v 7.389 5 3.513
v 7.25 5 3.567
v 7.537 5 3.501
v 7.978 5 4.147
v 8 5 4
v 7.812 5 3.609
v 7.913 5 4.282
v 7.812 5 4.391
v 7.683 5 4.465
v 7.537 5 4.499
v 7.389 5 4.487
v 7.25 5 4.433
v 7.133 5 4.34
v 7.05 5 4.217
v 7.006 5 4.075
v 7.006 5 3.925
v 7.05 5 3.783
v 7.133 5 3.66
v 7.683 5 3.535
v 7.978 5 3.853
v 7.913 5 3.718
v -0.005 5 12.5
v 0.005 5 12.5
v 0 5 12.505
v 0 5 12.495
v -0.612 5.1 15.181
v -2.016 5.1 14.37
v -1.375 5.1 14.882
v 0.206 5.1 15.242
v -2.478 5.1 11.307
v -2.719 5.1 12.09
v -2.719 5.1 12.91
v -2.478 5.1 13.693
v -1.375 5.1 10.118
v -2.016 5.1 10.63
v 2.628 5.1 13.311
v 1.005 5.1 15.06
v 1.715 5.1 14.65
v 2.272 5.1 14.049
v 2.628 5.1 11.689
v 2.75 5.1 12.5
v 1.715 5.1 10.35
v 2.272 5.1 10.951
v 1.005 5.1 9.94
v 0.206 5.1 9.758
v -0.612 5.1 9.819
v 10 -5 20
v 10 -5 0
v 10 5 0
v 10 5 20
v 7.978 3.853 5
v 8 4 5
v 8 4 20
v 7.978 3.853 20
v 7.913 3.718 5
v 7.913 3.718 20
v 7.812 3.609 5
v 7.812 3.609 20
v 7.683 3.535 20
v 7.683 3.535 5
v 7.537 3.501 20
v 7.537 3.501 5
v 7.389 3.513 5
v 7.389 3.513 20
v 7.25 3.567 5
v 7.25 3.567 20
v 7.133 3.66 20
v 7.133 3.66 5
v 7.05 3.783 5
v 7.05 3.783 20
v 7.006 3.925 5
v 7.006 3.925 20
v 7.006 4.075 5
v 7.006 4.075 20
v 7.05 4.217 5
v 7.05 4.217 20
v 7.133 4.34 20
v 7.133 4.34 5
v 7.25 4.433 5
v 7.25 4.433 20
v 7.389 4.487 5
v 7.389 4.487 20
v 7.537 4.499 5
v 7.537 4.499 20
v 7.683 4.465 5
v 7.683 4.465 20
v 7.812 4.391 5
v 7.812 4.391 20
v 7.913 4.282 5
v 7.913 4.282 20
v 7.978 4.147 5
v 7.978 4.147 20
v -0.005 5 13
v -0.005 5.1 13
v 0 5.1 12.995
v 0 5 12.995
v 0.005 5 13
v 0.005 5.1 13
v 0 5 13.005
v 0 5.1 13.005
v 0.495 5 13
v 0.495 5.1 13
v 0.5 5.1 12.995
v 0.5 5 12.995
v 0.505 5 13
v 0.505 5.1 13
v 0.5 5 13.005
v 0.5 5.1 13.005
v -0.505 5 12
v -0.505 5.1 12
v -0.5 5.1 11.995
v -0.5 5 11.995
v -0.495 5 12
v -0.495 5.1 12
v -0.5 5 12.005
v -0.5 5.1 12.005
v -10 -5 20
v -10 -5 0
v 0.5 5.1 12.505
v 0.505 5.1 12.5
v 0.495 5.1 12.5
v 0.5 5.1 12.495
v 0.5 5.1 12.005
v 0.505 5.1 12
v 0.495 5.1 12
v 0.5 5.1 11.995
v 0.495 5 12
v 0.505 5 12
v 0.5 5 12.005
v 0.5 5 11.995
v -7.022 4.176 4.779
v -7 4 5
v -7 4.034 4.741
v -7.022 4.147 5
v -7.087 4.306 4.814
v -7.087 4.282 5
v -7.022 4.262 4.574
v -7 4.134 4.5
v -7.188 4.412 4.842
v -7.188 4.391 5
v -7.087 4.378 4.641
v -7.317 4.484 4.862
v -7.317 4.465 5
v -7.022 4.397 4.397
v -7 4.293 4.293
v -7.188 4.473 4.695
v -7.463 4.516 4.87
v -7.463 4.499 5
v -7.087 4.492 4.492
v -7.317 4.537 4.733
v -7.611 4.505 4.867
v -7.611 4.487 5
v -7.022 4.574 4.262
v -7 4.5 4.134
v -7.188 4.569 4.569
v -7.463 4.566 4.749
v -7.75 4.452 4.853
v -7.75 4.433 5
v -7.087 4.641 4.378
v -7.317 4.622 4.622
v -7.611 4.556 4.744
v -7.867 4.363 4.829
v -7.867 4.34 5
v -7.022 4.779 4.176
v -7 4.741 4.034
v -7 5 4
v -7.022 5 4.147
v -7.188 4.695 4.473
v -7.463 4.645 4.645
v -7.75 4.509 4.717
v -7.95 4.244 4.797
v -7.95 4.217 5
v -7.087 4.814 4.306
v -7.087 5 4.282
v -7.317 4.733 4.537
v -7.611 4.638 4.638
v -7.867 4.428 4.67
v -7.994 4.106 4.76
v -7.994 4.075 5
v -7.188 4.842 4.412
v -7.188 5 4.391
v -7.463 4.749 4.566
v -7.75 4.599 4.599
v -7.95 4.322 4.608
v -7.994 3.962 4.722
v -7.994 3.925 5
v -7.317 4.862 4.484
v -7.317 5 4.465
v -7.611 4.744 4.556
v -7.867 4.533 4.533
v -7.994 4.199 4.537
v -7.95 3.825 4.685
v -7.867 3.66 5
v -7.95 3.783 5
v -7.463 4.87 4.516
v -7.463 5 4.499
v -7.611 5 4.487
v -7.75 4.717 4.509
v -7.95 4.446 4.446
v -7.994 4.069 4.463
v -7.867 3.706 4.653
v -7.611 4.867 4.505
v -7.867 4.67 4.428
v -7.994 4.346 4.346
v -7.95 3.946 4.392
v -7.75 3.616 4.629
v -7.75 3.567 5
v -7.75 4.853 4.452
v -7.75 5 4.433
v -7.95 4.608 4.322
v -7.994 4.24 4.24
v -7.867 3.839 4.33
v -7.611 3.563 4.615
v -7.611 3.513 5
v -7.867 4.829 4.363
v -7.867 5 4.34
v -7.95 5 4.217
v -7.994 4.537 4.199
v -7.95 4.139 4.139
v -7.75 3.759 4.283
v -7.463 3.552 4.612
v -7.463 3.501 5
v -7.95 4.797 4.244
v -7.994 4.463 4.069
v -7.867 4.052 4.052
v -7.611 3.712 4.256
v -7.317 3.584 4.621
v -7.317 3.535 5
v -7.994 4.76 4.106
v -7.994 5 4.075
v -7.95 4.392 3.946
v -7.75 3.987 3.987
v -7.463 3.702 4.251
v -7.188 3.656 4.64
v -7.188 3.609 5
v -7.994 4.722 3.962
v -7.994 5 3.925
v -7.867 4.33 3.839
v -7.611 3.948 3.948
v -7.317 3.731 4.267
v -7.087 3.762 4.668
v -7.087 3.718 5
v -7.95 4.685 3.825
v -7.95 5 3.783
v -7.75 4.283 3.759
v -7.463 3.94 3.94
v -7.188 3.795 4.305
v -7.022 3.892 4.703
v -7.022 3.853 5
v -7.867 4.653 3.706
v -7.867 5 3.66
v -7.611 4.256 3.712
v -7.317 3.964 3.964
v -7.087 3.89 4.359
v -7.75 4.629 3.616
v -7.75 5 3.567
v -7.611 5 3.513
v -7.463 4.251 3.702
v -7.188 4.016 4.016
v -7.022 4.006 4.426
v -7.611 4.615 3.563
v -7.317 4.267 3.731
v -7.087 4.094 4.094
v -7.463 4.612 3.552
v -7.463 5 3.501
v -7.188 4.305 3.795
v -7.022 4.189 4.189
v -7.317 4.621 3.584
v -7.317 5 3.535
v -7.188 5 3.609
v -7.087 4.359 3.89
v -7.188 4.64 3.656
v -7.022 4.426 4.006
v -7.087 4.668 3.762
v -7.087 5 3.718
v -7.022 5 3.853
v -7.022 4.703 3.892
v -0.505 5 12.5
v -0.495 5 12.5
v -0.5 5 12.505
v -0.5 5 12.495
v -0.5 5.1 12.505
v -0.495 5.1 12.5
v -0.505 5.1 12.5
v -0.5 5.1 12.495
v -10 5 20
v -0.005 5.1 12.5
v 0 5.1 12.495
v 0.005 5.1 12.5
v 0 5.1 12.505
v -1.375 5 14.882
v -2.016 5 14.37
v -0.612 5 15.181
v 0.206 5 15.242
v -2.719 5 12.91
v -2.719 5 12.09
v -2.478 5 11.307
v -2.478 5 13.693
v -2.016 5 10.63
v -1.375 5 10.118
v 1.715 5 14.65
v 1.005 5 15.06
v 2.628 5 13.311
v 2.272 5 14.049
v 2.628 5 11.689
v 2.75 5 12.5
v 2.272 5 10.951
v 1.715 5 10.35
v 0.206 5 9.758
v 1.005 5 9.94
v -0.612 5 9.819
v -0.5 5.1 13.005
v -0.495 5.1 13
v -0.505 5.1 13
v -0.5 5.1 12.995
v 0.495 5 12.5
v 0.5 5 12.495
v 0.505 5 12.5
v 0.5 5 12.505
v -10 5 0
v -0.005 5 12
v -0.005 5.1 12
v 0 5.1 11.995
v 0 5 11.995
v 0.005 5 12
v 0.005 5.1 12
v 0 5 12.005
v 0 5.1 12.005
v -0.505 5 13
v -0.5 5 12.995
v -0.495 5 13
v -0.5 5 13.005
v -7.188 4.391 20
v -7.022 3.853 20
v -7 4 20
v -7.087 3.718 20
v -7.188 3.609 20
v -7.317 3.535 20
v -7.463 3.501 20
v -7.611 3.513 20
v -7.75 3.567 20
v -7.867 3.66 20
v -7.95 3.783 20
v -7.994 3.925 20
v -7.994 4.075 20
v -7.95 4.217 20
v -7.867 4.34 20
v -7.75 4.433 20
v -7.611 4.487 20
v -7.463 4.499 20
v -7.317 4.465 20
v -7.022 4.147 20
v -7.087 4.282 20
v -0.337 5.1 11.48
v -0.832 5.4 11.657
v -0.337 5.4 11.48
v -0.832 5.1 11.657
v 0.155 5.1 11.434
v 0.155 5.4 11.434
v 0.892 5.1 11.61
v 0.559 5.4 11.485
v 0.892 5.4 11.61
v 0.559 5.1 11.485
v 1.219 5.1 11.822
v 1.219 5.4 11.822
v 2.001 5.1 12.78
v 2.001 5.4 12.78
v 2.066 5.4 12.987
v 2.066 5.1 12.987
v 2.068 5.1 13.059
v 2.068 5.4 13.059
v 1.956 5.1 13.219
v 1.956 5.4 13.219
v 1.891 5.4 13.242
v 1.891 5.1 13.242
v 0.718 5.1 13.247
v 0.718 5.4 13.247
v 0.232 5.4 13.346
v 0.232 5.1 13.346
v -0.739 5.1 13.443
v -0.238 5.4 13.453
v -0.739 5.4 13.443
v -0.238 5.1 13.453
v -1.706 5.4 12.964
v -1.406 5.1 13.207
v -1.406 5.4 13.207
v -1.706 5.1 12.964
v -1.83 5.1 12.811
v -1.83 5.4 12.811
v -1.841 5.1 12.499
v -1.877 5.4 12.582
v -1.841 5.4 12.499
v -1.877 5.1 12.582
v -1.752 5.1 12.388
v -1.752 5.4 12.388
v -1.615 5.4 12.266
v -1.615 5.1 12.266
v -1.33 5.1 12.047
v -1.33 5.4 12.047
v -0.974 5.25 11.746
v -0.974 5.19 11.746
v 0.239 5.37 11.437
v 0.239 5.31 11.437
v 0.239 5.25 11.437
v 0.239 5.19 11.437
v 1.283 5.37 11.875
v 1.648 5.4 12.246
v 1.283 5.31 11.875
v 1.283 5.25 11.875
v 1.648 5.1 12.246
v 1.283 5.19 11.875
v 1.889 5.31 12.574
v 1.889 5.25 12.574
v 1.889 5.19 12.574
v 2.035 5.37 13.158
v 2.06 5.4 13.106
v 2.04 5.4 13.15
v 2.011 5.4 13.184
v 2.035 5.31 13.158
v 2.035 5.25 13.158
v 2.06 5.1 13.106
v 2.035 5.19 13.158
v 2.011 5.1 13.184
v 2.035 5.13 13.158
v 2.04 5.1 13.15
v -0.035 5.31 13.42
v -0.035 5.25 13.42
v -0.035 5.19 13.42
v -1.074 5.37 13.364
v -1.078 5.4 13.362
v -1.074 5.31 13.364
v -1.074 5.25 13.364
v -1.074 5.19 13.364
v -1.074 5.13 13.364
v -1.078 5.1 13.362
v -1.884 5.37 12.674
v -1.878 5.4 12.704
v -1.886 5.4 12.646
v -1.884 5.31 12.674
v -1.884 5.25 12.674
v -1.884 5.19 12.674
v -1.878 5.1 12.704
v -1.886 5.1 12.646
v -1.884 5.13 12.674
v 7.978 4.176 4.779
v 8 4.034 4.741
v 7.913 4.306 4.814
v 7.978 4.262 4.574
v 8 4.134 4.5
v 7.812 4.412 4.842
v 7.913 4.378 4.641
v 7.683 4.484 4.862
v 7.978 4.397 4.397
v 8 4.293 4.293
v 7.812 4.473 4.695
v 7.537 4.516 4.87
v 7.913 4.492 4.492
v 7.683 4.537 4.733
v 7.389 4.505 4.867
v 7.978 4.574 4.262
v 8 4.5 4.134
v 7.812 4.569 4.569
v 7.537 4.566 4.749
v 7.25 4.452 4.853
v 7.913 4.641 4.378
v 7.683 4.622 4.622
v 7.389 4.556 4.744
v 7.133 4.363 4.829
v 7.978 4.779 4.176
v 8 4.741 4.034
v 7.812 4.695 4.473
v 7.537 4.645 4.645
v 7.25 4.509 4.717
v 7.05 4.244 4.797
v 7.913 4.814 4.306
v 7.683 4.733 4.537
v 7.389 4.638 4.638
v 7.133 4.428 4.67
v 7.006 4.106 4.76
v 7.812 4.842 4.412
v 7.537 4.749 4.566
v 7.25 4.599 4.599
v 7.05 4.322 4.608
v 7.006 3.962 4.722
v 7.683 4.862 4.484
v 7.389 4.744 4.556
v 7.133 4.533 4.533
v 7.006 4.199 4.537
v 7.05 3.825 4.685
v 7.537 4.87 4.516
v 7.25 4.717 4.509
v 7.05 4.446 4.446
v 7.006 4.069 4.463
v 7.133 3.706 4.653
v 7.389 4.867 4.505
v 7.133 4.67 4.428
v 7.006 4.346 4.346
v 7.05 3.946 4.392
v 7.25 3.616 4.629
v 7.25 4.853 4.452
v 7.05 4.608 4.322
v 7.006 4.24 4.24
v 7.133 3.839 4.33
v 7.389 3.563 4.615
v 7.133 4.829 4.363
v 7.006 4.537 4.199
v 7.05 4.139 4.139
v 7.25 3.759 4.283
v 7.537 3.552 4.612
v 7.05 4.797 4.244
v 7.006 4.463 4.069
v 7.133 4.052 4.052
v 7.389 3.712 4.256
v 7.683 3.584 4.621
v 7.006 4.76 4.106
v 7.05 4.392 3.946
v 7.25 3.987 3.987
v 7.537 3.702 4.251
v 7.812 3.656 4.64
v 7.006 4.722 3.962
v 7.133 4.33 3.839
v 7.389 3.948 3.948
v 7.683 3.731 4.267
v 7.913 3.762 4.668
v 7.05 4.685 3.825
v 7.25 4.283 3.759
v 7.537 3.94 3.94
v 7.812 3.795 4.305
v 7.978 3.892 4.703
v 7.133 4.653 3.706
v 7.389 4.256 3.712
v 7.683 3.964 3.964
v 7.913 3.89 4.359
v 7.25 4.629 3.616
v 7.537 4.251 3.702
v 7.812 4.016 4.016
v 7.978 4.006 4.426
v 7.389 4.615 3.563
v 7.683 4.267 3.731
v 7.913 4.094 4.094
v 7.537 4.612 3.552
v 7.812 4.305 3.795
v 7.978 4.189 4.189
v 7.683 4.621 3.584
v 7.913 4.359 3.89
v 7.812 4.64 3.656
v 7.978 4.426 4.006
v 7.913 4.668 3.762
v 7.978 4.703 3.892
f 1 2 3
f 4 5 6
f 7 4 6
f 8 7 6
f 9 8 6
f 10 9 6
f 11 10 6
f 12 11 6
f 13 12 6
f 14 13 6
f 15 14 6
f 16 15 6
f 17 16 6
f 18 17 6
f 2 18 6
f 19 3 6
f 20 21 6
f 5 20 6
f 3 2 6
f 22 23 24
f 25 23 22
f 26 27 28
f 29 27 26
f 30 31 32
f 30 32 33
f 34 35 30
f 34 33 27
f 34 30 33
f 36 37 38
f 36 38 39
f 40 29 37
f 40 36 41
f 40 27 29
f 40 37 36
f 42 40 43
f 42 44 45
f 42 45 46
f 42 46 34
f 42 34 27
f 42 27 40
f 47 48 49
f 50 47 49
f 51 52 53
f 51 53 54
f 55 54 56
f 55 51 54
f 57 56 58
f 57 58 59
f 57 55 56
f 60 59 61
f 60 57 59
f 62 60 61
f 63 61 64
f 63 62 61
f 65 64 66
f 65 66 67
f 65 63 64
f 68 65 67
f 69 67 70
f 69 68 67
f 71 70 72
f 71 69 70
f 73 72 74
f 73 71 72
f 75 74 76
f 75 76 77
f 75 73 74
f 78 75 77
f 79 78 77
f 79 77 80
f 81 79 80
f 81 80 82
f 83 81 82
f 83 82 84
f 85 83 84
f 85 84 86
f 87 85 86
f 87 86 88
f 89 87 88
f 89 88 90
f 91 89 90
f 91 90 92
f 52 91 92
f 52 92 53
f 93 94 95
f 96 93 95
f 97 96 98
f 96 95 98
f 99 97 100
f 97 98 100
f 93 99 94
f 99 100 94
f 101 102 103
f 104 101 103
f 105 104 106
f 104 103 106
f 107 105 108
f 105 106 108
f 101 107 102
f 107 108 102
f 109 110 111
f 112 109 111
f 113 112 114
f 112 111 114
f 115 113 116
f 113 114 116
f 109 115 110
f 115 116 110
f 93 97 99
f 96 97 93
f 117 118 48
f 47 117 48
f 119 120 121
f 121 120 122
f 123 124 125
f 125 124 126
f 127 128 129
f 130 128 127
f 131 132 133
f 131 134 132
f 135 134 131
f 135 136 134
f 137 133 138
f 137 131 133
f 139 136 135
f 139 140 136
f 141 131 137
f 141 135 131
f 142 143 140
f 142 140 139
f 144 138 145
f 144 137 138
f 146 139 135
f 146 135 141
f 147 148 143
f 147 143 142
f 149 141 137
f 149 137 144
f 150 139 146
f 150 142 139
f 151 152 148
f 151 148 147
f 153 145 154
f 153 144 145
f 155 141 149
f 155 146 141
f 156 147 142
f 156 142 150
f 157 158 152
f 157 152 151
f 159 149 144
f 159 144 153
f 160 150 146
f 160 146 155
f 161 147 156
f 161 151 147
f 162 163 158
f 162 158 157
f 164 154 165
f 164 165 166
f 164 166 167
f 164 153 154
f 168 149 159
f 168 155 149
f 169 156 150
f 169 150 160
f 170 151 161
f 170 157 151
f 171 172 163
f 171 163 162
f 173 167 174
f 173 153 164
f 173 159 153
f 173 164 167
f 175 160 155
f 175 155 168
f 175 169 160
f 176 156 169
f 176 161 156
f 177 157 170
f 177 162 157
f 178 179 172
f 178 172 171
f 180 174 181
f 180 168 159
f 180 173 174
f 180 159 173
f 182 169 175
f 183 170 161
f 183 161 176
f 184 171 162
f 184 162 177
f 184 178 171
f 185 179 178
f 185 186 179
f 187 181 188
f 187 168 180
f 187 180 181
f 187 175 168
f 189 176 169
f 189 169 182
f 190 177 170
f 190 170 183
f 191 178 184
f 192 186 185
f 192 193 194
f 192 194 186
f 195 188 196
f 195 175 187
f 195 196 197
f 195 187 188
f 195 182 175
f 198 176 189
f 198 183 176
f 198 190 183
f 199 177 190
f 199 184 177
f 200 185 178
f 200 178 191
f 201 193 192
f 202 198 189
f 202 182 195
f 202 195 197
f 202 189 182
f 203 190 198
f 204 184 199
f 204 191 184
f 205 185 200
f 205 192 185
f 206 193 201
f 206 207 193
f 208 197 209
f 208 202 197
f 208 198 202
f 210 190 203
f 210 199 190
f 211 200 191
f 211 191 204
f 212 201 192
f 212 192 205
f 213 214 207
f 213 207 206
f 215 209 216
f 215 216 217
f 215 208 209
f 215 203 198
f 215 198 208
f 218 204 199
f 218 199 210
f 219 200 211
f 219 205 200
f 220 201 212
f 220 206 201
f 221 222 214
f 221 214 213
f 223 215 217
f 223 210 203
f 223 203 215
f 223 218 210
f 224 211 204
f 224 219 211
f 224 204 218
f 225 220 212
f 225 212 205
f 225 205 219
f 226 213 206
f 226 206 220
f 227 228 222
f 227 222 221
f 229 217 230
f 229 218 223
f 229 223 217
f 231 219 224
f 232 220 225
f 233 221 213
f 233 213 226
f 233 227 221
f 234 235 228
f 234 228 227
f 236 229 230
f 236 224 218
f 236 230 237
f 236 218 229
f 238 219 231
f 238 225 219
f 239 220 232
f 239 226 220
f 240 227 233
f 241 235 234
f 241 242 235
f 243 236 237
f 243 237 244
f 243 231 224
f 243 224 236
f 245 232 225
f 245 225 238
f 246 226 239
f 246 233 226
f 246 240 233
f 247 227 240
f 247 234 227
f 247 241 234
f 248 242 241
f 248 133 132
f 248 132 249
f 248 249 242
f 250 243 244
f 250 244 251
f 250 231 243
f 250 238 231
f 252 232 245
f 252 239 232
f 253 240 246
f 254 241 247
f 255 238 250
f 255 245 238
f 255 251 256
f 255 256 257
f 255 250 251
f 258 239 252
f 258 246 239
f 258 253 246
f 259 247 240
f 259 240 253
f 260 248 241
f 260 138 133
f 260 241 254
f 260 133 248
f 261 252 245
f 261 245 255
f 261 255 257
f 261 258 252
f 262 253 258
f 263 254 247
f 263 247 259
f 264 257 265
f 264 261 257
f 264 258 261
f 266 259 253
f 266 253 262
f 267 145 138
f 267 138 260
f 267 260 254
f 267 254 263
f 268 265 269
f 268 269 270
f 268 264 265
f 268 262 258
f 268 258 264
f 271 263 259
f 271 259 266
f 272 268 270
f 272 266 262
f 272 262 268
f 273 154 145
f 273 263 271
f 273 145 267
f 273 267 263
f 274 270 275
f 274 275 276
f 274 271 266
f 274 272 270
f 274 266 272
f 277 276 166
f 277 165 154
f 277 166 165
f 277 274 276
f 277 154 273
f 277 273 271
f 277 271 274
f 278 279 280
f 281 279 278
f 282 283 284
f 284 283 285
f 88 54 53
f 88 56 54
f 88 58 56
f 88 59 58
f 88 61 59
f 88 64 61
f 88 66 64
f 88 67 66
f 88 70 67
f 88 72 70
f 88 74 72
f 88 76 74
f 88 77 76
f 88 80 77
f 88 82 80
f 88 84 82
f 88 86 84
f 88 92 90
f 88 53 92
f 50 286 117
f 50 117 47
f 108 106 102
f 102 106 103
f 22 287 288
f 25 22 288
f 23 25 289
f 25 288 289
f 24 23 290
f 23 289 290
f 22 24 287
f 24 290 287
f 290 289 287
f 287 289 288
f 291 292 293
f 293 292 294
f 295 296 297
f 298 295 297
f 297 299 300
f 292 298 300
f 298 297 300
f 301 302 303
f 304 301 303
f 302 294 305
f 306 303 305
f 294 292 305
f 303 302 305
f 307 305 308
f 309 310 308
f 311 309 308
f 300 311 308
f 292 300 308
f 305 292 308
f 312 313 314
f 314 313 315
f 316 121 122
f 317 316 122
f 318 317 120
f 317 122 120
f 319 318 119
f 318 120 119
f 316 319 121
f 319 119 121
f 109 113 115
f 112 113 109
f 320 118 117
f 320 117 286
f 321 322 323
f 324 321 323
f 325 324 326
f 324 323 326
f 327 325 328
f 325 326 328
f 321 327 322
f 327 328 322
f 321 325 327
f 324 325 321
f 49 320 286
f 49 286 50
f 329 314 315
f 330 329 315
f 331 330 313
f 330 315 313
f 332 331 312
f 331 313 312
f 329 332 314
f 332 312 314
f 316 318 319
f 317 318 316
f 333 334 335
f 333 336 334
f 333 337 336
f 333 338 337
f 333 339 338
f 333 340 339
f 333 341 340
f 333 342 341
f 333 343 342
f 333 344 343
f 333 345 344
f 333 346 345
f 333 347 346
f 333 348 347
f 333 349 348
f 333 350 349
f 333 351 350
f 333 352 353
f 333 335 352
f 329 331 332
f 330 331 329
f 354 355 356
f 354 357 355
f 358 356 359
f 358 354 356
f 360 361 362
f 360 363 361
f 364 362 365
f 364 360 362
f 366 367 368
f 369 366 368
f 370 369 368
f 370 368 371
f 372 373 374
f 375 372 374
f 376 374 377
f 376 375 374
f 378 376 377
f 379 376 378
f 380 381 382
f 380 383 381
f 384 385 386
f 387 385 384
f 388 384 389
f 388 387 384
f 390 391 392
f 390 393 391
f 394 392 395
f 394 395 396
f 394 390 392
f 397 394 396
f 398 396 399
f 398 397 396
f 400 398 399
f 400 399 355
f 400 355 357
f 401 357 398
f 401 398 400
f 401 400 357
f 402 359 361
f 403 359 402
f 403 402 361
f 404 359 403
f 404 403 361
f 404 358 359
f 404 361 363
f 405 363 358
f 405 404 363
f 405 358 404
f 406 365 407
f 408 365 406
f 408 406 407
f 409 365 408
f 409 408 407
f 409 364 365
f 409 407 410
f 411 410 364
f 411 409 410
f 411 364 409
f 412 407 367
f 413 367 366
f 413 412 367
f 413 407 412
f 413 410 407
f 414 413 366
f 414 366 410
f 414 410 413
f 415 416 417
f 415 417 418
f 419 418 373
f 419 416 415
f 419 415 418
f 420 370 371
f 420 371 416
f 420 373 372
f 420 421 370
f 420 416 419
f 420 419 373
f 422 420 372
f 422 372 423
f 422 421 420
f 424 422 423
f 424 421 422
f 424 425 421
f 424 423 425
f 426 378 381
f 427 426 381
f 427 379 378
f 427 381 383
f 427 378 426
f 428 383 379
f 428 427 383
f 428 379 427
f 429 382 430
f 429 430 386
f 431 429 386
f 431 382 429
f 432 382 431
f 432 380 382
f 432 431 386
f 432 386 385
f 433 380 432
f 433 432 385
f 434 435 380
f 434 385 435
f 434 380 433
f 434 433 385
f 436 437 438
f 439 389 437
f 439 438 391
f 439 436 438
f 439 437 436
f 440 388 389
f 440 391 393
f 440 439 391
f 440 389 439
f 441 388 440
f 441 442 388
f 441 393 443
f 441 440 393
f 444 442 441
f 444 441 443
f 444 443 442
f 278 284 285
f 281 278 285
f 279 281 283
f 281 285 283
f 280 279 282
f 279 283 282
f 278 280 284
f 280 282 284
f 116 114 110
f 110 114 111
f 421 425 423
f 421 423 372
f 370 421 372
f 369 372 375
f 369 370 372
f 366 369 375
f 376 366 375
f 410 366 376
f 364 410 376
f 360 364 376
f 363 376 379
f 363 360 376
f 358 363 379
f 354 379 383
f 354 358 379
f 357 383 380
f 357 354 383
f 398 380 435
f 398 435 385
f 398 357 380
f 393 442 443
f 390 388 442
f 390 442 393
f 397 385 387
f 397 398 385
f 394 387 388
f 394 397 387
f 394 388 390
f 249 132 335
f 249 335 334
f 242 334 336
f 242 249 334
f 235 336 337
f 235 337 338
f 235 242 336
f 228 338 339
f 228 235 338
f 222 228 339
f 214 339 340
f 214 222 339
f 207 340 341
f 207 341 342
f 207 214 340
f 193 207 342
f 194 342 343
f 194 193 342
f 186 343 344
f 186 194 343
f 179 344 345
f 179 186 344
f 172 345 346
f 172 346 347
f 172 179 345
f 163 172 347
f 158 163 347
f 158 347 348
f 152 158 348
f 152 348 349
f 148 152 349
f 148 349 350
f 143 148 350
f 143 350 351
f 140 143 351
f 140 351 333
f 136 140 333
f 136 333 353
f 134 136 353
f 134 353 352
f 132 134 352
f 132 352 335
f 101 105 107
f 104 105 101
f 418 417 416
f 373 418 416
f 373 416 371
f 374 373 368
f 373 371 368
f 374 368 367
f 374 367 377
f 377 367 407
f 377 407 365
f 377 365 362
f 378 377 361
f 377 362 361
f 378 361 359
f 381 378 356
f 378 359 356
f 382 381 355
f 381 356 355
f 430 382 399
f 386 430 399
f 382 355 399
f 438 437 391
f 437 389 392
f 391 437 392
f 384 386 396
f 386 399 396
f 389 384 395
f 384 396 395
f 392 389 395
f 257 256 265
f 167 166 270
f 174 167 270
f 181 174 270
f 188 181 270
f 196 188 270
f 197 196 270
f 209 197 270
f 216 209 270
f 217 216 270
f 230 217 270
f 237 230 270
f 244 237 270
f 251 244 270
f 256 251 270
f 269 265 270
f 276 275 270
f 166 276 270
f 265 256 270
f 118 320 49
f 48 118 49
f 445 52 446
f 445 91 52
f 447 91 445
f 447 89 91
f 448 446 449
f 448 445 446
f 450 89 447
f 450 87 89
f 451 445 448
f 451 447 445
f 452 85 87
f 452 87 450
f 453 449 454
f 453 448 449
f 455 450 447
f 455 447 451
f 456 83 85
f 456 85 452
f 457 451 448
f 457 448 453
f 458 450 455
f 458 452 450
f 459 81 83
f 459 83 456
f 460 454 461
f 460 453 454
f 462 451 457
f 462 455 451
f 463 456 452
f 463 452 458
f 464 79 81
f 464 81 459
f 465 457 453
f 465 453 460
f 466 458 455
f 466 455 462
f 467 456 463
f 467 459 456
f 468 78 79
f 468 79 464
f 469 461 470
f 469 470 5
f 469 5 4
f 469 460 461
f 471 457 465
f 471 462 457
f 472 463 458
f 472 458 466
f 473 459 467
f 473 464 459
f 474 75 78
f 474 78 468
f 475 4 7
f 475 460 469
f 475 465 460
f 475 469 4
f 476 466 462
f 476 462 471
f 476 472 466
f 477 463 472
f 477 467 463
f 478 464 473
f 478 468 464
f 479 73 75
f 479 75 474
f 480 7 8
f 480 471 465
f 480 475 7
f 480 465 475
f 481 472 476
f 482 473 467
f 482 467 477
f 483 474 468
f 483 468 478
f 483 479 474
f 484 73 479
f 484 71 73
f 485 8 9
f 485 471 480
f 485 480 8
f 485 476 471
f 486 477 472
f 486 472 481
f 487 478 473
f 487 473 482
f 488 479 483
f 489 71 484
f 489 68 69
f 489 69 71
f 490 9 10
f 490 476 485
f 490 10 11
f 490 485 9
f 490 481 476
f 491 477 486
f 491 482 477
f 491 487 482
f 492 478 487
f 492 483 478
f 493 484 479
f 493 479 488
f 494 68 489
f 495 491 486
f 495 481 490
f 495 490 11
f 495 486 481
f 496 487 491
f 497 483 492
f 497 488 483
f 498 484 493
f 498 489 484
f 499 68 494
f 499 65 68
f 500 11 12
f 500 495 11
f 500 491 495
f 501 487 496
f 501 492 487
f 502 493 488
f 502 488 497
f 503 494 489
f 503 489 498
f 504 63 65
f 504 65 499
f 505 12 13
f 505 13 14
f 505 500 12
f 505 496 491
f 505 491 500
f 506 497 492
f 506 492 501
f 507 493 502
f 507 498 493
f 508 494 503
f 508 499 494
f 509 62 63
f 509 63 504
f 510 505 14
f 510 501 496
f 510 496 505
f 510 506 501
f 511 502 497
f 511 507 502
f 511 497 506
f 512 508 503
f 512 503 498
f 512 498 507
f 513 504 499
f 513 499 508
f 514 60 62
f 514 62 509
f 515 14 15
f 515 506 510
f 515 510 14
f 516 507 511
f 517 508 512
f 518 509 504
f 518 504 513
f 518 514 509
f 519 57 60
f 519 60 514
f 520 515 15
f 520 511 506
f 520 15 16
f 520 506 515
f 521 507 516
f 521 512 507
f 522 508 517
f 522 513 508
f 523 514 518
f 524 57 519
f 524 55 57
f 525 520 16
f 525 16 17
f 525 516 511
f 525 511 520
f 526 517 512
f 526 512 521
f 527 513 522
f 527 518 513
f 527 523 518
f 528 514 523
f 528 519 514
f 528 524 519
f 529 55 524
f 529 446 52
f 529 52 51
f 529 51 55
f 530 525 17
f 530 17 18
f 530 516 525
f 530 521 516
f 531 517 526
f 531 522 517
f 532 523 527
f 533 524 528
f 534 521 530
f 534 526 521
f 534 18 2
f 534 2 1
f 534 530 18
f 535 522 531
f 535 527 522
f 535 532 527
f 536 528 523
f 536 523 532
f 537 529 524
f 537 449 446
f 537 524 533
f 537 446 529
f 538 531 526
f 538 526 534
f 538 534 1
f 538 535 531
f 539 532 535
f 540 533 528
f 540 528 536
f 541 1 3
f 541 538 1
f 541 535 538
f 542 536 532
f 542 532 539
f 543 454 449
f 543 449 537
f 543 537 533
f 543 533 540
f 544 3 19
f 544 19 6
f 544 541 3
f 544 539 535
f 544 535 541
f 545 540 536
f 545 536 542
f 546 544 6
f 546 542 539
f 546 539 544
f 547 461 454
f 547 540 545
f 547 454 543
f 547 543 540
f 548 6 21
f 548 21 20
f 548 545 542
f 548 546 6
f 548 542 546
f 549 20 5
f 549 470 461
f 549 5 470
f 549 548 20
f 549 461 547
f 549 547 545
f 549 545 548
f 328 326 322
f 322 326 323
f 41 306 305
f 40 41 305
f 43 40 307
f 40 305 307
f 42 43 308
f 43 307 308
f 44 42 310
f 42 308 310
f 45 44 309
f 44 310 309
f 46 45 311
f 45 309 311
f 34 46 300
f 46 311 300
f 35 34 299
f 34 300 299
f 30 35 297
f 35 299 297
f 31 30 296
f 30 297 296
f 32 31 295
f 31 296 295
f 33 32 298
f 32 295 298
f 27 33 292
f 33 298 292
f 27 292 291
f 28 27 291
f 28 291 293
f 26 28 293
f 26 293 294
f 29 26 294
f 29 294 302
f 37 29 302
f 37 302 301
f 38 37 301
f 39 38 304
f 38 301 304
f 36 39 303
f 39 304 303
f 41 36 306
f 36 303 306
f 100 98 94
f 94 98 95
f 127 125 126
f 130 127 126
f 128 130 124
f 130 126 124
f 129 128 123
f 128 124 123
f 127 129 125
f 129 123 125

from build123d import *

# Parameters (mm, degrees)
SKETCH1_W             = 20
SKETCH1_H             = 10
BOSS_EXTRUDE1_DEPTH   = 20
SKETCH2_R             = 0.5
SKETCH5_R             = 2.75
BOSS_EXTRUDE4_DEPTH   = 0.1
SKETCH8_R             = 0.005
BOSS_EXTRUDE5_DEPTH   = 0.1
BOSS_EXTRUDE5_2_DEPTH = 0.1
BOSS_EXTRUDE5_3_DEPTH = 0.1
BOSS_EXTRUDE5_4_DEPTH = 0.1
BOSS_EXTRUDE5_5_DEPTH = 0.1
BOSS_EXTRUDE5_6_DEPTH = 0.1
BOSS_EXTRUDE5_7_DEPTH = 0.1
BOSS_EXTRUDE5_8_DEPTH = 0.1
BOSS_EXTRUDE5_9_DEPTH = 0.1
SLICE_2_DEPTH         = 0.3


with BuildPart() as part:
    # Sketch1 → Boss-Extrude1 (new body)
    with BuildSketch(Plane.XY):
        Rectangle(SKETCH1_W, SKETCH1_H)
    extrude(amount=BOSS_EXTRUDE1_DEPTH)


with BuildPart() as body_2:
    # ag/agcl electrodes: sweep along a path in Sketch3
    with BuildLine(Plane(origin=(7.5, 0, 0), x_dir=(0, 0, -1), z_dir=(1, 0, 0))) as ag_agcl_electrodes_path:
        Line((-20, 4), (-5, 4))
        ThreePointArc((-5, 4), (-4.292893219, 4.292893219), (-4, 5))
    # Sketch2 → ag/agcl electrodes (sweep)
    with BuildSketch(Plane.XY.offset(20)):
        with Locations((-7.5, 4)):
            Circle(SKETCH2_R)
        with Locations((7.5, 4)):
            Circle(SKETCH2_R)
    sweep(path=ag_agcl_electrodes_path.line)


with BuildPart() as body_3:
    # Sketch5 → Boss-Extrude4 (new body)
    with BuildSketch(Plane(origin=(0, 5, 0), x_dir=(1, 0, 0), z_dir=(0, 1, 0))):
        with Locations((0, -12.5)):
            Circle(SKETCH5_R)
    extrude(amount=BOSS_EXTRUDE4_DEPTH)


with BuildPart() as body_4:
    # Sketch8 → Boss-Extrude5 (new body)
    with BuildSketch(Plane(origin=(0, 5.1, 0), x_dir=(-1, 0, 0), z_dir=(0, -1, 0))):
        with Locations((0, -12.5)):
            Circle(SKETCH8_R)
    extrude(amount=BOSS_EXTRUDE5_DEPTH)


with BuildPart() as body_5:
    # Sketch8 → Boss-Extrude5 2 (new body)
    with BuildSketch(Plane(origin=(0, 5.1, 0), x_dir=(-1, 0, 0), z_dir=(0, -1, 0))):
        with Locations((0.5, -12.5)):
            Circle(SKETCH8_R)
    extrude(amount=BOSS_EXTRUDE5_2_DEPTH)


with BuildPart() as body_6:
    # Sketch8 → Boss-Extrude5 3 (new body)
    with BuildSketch(Plane(origin=(0, 5.1, 0), x_dir=(-1, 0, 0), z_dir=(0, -1, 0))):
        with Locations((0.5, -12)):
            Circle(SKETCH8_R)
    extrude(amount=BOSS_EXTRUDE5_3_DEPTH)


with BuildPart() as body_7:
    # Sketch8 → Boss-Extrude5 4 (new body)
    with BuildSketch(Plane(origin=(0, 5.1, 0), x_dir=(-1, 0, 0), z_dir=(0, -1, 0))):
        with Locations((0, -12)):
            Circle(SKETCH8_R)
    extrude(amount=BOSS_EXTRUDE5_4_DEPTH)


with BuildPart() as body_8:
    # Sketch8 → Boss-Extrude5 5 (new body)
    with BuildSketch(Plane(origin=(0, 5.1, 0), x_dir=(-1, 0, 0), z_dir=(0, -1, 0))):
        with Locations((0.5, -13)):
            Circle(SKETCH8_R)
    extrude(amount=BOSS_EXTRUDE5_5_DEPTH)


with BuildPart() as body_9:
    # Sketch8 → Boss-Extrude5 6 (new body)
    with BuildSketch(Plane(origin=(0, 5.1, 0), x_dir=(-1, 0, 0), z_dir=(0, -1, 0))):
        with Locations((0, -13)):
            Circle(SKETCH8_R)
    extrude(amount=BOSS_EXTRUDE5_6_DEPTH)


with BuildPart() as body_10:
    # Sketch8 → Boss-Extrude5 7 (new body)
    with BuildSketch(Plane(origin=(0, 5.1, 0), x_dir=(-1, 0, 0), z_dir=(0, -1, 0))):
        with Locations((-0.5, -13)):
            Circle(SKETCH8_R)
    extrude(amount=BOSS_EXTRUDE5_7_DEPTH)


with BuildPart() as body_11:
    # Sketch8 → Boss-Extrude5 8 (new body)
    with BuildSketch(Plane(origin=(0, 5.1, 0), x_dir=(-1, 0, 0), z_dir=(0, -1, 0))):
        with Locations((-0.5, -12)):
            Circle(SKETCH8_R)
    extrude(amount=BOSS_EXTRUDE5_8_DEPTH)


with BuildPart() as body_12:
    # Sketch8 → Boss-Extrude5 9 (new body)
    with BuildSketch(Plane(origin=(0, 5.1, 0), x_dir=(-1, 0, 0), z_dir=(0, -1, 0))):
        with Locations((-0.5, -12.5)):
            Circle(SKETCH8_R)
    extrude(amount=BOSS_EXTRUDE5_9_DEPTH)


with BuildPart() as body_13:
    # Sketch4 → slice 2 (new body)
    with BuildSketch(Plane(origin=(0, 5.1, 0), x_dir=(1, 0, 0), z_dir=(0, 1, 0))):
        with BuildLine():
            add(Edge.make_bspline(
                [(-1.329786825, -12.04709664), (-1.196342031, -11.939424685), (-0.824147777, -11.548957834), (0.251281573, -11.322574475), (1.372606671, -11.746573561), (2.652909809, -13.571837262), (0.780549472, -13.104467787), (-0.122057097, -13.506347246), (-0.994791107, -13.460960152), (-1.586432094, -13.116889112), (-2.086144249, -12.539169772), (-1.569499382, -12.240512354), (-1.329786825, -12.04709664)],
                knots=[0, 0, 0, 0, 0.049562645, 0.182817887, 0.303261475, 0.461561344, 0.613381106, 0.684437877, 0.79516613, 0.866564728, 0.910968514, 1, 1, 1, 1], degree=3))
        make_face()
    extrude(amount=SLICE_2_DEPTH)


solid = Compound([part.part, body_2.part, body_3.part, body_4.part, body_5.part, body_6.part, body_7.part, body_8.part, body_9.part, body_10.part, body_11.part, body_12.part, body_13.part])
